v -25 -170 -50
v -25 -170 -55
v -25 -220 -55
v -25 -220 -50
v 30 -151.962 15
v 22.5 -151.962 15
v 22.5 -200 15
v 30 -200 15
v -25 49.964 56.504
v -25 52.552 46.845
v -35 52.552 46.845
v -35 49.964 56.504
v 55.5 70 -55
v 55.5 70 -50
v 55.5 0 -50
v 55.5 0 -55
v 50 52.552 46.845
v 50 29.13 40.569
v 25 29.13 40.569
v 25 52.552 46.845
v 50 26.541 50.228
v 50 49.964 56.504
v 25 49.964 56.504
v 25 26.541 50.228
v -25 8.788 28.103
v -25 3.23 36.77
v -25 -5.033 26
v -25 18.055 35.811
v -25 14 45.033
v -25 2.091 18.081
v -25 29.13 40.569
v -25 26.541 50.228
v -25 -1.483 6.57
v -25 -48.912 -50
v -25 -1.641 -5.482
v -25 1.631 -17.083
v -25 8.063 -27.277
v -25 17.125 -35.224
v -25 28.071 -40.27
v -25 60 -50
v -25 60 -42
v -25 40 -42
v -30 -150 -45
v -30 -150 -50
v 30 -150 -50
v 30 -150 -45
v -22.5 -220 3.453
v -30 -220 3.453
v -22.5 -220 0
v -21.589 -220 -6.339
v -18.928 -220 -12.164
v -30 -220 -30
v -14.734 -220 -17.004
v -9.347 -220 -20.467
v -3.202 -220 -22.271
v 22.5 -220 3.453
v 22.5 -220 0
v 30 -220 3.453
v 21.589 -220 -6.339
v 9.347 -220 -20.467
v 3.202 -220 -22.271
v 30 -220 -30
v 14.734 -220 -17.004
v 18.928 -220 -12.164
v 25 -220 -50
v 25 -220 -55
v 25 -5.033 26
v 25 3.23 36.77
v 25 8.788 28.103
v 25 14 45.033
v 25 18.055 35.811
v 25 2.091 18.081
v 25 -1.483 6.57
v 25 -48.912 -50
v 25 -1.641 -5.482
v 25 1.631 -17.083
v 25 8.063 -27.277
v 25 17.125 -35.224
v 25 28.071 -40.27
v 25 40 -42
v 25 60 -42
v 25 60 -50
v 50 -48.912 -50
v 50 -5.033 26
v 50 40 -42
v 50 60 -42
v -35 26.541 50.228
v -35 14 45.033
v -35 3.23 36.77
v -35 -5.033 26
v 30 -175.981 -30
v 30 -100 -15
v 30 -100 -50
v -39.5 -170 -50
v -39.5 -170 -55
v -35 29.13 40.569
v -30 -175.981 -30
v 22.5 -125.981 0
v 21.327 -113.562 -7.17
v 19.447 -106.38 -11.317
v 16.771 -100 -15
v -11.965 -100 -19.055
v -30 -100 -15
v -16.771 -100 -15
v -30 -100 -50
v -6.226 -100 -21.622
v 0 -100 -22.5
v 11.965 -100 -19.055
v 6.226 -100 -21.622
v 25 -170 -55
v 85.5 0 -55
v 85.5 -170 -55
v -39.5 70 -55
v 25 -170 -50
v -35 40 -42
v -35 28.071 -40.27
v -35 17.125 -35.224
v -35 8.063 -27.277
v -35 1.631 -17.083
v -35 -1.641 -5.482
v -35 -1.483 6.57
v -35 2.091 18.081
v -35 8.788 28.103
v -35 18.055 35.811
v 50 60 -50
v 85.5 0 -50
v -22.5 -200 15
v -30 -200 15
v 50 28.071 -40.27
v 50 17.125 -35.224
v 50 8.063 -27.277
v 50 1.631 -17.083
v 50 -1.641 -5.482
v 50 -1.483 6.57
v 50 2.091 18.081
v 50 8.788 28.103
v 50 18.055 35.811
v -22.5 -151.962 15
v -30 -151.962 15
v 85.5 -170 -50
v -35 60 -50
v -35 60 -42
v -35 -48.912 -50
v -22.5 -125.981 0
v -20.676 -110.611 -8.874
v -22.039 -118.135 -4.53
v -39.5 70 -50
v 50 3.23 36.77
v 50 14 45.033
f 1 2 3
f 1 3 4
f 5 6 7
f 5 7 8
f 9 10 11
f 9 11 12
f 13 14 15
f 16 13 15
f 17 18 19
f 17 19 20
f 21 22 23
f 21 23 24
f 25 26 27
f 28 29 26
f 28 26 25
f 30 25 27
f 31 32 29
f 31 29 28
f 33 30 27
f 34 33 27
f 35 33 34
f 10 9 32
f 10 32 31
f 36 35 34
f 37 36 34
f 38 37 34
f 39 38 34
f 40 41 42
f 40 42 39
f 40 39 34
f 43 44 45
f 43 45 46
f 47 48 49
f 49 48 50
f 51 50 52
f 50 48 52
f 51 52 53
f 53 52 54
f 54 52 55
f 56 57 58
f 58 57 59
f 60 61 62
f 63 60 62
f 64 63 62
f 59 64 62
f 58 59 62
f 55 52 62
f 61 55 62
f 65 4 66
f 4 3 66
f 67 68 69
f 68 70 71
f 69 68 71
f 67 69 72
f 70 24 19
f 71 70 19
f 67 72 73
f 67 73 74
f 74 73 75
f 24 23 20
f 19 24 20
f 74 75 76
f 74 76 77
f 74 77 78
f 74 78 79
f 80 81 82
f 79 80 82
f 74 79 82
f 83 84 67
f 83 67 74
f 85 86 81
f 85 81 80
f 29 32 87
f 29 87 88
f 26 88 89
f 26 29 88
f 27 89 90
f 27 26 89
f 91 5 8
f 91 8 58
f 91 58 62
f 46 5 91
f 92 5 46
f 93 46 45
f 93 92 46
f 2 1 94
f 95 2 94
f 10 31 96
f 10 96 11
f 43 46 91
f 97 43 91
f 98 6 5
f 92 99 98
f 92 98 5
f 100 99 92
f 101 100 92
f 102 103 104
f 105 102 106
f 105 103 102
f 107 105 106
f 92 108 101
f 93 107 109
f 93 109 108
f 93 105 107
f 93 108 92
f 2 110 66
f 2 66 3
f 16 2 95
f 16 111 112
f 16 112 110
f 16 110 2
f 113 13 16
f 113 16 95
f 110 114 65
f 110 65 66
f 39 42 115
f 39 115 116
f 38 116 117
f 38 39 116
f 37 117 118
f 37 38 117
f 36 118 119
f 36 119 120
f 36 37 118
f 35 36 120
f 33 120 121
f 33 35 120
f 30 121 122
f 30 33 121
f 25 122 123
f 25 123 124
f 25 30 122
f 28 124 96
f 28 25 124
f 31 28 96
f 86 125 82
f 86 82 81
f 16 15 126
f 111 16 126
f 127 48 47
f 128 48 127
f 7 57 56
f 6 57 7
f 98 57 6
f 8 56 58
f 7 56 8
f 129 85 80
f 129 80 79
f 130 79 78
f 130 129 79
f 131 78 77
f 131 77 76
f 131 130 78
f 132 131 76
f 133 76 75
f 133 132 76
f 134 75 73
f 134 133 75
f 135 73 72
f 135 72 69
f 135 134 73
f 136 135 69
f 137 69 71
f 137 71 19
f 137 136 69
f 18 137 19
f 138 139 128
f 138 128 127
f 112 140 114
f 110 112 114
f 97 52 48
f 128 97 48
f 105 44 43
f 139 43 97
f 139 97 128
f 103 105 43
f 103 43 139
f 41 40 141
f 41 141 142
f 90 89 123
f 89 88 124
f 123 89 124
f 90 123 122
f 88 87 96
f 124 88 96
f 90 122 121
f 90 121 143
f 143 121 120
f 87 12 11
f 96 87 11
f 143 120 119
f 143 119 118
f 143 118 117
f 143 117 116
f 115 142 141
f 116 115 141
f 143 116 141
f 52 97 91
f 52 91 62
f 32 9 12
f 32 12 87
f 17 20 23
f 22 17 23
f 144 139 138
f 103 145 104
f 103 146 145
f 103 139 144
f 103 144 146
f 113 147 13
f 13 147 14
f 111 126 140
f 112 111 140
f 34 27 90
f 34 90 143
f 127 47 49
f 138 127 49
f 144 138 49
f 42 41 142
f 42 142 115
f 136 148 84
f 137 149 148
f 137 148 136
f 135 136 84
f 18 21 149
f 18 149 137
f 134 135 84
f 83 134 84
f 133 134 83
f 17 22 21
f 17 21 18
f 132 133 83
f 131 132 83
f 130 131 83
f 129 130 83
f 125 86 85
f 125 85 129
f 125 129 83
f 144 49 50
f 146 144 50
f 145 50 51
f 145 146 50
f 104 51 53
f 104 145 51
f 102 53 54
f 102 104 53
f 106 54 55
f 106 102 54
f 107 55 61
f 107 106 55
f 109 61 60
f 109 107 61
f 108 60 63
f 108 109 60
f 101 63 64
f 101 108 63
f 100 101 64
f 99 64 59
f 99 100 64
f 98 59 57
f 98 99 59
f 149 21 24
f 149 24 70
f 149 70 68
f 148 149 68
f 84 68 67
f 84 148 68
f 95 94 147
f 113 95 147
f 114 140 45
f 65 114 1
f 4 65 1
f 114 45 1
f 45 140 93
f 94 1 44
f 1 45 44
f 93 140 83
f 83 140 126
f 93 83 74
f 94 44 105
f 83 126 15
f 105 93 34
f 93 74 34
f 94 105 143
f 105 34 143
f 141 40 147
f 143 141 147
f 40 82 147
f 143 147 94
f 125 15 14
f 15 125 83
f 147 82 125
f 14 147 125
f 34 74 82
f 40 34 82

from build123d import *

# Parameters (mm, degrees)
BOSS_EXTRUDE1_START     = 10
BOSS_EXTRUDE1_DEPTH     = 5
BOSS_EXTRUDE2_START     = -25
BOSS_EXTRUDE2_DEPTH     = 10
BOSS_EXTRUDE3_START     = 50
BOSS_EXTRUDE3_DEPTH     = 25
BOSS_EXTRUDE6_START     = -100
BOSS_EXTRUDE6_DEPTH     = 120
CUT_EXTRUDE1_DEPTH      = 243.699343574
CUT_EXTRUDE1_DEPTH_BACK = 243.699343574


with BuildPart() as part:
    # Sketch2 → Boss-Extrude1 (new body)
    with BuildSketch(Plane(origin=(0, 0, -40), x_dir=(-1, 0, 0), z_dir=(0, 0, -1)).offset(BOSS_EXTRUDE1_START)):
        Polygon((-55.5, 0), (-85.5, 0), (-85.5, -170), (39.5, -170), (39.5, 70), (-55.5, 70), align=None)
    extrude(amount=BOSS_EXTRUDE1_DEPTH)

    # Sketch3 → Boss-Extrude2 (add)
    with BuildSketch(Plane(origin=(0, 0, 0), x_dir=(0, 0, -1), z_dir=(1, 0, 0)).offset(BOSS_EXTRUDE2_START)):
        with BuildLine():
            Line((-56.504171272, 49.963866159), (-50.228142967, 26.541409655))
            ThreePointArc((-50.228142967, 26.541409655), (-41.254373695, 8.344405692), (-26, -5.033320997))
            Line((-26, -5.033320997), (50, -48.911941455))
            Line((50, -48.911941455), (55, -48.911941455))
            Line((55, -48.911941455), (55, -28.911941455))
            Line((55, -28.911941455), (50, -28.911941455))
            Line((50, -28.911941455), (50, 30))
            Line((50, 30), (55, 30))
            Line((55, 30), (55, 60))
            Line((55, 60), (42, 60))
            Line((42, 60), (42, 40))
            ThreePointArc((42, 40), (5.482100073, -1.640684178), (-40.568884704, 29.129600106))
            Line((-40.568884704, 29.129600106), (-46.844913009, 52.55205661))
            Line((-46.844913009, 52.55205661), (-56.504171272, 49.963866159))
        make_face()
    extrude(amount=-BOSS_EXTRUDE2_DEPTH)

    # Sketch3<3> → Boss-Extrude3 (add)
    with BuildSketch(Plane(origin=(0, 0, 0), x_dir=(0, 0, -1), z_dir=(1, 0, 0)).offset(BOSS_EXTRUDE3_START)):
        with BuildLine():
            Line((-56.504171272, 49.963866159), (-50.228142967, 26.541409655))
            ThreePointArc((-50.228142967, 26.541409655), (-41.254373695, 8.344405692), (-26, -5.033320997))
            Line((-26, -5.033320997), (50, -48.911941455))
            Line((50, -48.911941455), (55, -48.911941455))
            Line((55, -48.911941455), (55, -28.911941455))
            Line((55, -28.911941455), (50, -28.911941455))
            Line((50, -28.911941455), (50, 30))
            Line((50, 30), (55, 30))
            Line((55, 30), (55, 60))
            Line((55, 60), (42, 60))
            Line((42, 60), (42, 40))
            ThreePointArc((42, 40), (5.482100073, -1.640684178), (-40.568884704, 29.129600106))
            Line((-40.568884704, 29.129600106), (-46.844913009, 52.55205661))
            Line((-46.844913009, 52.55205661), (-56.504171272, 49.963866159))
        make_face()
    extrude(amount=-BOSS_EXTRUDE3_DEPTH)

    # Sketch4 → Boss-Extrude6 (add)
    with BuildSketch(Plane(origin=(0, 0, 0), x_dir=(1, 0, 0), z_dir=(0, 1, 0)).offset(BOSS_EXTRUDE6_START)):
        with BuildLine():
            Line((22.5, -15), (30, -15))
            Line((30, -15), (30, 50))
            Line((30, 50), (25, 50))
            Line((25, 50), (25, 55))
            Line((25, 55), (-25, 55))
            Line((-25, 55), (-25, 50))
            Line((-25, 50), (-30, 50))
            Line((-30, 50), (-30, -15))
            Line((-30, -15), (-22.5, -15))
            Line((-22.5, -15), (-22.5, 0))
            ThreePointArc((-22.5, 0), (0, 22.5), (22.5, 0))
            Line((22.5, 0), (22.5, -15))
        make_face()
    extrude(amount=-BOSS_EXTRUDE6_DEPTH)

    # Sketch3<8> → Cut-Extrude1 (cut, two sides: drawn at the far end of the back side and taken through both)
    with BuildSketch(Plane(origin=(0, 0, 0), x_dir=(0, 0, -1), z_dir=(1, 0, 0)).offset(-CUT_EXTRUDE1_DEPTH_BACK)):
        Polygon((15, -100), (50, -100), (50, -80), (-50, -80), (-50, -245), (50, -245), (50, -150), (45, -150), (30, -175.980762114), (30, -220), (-3.452994616, -220), (-15, -200), (-15, -151.961524227), align=None)
    extrude(amount=CUT_EXTRUDE1_DEPTH + CUT_EXTRUDE1_DEPTH_BACK, mode=Mode.SUBTRACT)


solid = part.part
